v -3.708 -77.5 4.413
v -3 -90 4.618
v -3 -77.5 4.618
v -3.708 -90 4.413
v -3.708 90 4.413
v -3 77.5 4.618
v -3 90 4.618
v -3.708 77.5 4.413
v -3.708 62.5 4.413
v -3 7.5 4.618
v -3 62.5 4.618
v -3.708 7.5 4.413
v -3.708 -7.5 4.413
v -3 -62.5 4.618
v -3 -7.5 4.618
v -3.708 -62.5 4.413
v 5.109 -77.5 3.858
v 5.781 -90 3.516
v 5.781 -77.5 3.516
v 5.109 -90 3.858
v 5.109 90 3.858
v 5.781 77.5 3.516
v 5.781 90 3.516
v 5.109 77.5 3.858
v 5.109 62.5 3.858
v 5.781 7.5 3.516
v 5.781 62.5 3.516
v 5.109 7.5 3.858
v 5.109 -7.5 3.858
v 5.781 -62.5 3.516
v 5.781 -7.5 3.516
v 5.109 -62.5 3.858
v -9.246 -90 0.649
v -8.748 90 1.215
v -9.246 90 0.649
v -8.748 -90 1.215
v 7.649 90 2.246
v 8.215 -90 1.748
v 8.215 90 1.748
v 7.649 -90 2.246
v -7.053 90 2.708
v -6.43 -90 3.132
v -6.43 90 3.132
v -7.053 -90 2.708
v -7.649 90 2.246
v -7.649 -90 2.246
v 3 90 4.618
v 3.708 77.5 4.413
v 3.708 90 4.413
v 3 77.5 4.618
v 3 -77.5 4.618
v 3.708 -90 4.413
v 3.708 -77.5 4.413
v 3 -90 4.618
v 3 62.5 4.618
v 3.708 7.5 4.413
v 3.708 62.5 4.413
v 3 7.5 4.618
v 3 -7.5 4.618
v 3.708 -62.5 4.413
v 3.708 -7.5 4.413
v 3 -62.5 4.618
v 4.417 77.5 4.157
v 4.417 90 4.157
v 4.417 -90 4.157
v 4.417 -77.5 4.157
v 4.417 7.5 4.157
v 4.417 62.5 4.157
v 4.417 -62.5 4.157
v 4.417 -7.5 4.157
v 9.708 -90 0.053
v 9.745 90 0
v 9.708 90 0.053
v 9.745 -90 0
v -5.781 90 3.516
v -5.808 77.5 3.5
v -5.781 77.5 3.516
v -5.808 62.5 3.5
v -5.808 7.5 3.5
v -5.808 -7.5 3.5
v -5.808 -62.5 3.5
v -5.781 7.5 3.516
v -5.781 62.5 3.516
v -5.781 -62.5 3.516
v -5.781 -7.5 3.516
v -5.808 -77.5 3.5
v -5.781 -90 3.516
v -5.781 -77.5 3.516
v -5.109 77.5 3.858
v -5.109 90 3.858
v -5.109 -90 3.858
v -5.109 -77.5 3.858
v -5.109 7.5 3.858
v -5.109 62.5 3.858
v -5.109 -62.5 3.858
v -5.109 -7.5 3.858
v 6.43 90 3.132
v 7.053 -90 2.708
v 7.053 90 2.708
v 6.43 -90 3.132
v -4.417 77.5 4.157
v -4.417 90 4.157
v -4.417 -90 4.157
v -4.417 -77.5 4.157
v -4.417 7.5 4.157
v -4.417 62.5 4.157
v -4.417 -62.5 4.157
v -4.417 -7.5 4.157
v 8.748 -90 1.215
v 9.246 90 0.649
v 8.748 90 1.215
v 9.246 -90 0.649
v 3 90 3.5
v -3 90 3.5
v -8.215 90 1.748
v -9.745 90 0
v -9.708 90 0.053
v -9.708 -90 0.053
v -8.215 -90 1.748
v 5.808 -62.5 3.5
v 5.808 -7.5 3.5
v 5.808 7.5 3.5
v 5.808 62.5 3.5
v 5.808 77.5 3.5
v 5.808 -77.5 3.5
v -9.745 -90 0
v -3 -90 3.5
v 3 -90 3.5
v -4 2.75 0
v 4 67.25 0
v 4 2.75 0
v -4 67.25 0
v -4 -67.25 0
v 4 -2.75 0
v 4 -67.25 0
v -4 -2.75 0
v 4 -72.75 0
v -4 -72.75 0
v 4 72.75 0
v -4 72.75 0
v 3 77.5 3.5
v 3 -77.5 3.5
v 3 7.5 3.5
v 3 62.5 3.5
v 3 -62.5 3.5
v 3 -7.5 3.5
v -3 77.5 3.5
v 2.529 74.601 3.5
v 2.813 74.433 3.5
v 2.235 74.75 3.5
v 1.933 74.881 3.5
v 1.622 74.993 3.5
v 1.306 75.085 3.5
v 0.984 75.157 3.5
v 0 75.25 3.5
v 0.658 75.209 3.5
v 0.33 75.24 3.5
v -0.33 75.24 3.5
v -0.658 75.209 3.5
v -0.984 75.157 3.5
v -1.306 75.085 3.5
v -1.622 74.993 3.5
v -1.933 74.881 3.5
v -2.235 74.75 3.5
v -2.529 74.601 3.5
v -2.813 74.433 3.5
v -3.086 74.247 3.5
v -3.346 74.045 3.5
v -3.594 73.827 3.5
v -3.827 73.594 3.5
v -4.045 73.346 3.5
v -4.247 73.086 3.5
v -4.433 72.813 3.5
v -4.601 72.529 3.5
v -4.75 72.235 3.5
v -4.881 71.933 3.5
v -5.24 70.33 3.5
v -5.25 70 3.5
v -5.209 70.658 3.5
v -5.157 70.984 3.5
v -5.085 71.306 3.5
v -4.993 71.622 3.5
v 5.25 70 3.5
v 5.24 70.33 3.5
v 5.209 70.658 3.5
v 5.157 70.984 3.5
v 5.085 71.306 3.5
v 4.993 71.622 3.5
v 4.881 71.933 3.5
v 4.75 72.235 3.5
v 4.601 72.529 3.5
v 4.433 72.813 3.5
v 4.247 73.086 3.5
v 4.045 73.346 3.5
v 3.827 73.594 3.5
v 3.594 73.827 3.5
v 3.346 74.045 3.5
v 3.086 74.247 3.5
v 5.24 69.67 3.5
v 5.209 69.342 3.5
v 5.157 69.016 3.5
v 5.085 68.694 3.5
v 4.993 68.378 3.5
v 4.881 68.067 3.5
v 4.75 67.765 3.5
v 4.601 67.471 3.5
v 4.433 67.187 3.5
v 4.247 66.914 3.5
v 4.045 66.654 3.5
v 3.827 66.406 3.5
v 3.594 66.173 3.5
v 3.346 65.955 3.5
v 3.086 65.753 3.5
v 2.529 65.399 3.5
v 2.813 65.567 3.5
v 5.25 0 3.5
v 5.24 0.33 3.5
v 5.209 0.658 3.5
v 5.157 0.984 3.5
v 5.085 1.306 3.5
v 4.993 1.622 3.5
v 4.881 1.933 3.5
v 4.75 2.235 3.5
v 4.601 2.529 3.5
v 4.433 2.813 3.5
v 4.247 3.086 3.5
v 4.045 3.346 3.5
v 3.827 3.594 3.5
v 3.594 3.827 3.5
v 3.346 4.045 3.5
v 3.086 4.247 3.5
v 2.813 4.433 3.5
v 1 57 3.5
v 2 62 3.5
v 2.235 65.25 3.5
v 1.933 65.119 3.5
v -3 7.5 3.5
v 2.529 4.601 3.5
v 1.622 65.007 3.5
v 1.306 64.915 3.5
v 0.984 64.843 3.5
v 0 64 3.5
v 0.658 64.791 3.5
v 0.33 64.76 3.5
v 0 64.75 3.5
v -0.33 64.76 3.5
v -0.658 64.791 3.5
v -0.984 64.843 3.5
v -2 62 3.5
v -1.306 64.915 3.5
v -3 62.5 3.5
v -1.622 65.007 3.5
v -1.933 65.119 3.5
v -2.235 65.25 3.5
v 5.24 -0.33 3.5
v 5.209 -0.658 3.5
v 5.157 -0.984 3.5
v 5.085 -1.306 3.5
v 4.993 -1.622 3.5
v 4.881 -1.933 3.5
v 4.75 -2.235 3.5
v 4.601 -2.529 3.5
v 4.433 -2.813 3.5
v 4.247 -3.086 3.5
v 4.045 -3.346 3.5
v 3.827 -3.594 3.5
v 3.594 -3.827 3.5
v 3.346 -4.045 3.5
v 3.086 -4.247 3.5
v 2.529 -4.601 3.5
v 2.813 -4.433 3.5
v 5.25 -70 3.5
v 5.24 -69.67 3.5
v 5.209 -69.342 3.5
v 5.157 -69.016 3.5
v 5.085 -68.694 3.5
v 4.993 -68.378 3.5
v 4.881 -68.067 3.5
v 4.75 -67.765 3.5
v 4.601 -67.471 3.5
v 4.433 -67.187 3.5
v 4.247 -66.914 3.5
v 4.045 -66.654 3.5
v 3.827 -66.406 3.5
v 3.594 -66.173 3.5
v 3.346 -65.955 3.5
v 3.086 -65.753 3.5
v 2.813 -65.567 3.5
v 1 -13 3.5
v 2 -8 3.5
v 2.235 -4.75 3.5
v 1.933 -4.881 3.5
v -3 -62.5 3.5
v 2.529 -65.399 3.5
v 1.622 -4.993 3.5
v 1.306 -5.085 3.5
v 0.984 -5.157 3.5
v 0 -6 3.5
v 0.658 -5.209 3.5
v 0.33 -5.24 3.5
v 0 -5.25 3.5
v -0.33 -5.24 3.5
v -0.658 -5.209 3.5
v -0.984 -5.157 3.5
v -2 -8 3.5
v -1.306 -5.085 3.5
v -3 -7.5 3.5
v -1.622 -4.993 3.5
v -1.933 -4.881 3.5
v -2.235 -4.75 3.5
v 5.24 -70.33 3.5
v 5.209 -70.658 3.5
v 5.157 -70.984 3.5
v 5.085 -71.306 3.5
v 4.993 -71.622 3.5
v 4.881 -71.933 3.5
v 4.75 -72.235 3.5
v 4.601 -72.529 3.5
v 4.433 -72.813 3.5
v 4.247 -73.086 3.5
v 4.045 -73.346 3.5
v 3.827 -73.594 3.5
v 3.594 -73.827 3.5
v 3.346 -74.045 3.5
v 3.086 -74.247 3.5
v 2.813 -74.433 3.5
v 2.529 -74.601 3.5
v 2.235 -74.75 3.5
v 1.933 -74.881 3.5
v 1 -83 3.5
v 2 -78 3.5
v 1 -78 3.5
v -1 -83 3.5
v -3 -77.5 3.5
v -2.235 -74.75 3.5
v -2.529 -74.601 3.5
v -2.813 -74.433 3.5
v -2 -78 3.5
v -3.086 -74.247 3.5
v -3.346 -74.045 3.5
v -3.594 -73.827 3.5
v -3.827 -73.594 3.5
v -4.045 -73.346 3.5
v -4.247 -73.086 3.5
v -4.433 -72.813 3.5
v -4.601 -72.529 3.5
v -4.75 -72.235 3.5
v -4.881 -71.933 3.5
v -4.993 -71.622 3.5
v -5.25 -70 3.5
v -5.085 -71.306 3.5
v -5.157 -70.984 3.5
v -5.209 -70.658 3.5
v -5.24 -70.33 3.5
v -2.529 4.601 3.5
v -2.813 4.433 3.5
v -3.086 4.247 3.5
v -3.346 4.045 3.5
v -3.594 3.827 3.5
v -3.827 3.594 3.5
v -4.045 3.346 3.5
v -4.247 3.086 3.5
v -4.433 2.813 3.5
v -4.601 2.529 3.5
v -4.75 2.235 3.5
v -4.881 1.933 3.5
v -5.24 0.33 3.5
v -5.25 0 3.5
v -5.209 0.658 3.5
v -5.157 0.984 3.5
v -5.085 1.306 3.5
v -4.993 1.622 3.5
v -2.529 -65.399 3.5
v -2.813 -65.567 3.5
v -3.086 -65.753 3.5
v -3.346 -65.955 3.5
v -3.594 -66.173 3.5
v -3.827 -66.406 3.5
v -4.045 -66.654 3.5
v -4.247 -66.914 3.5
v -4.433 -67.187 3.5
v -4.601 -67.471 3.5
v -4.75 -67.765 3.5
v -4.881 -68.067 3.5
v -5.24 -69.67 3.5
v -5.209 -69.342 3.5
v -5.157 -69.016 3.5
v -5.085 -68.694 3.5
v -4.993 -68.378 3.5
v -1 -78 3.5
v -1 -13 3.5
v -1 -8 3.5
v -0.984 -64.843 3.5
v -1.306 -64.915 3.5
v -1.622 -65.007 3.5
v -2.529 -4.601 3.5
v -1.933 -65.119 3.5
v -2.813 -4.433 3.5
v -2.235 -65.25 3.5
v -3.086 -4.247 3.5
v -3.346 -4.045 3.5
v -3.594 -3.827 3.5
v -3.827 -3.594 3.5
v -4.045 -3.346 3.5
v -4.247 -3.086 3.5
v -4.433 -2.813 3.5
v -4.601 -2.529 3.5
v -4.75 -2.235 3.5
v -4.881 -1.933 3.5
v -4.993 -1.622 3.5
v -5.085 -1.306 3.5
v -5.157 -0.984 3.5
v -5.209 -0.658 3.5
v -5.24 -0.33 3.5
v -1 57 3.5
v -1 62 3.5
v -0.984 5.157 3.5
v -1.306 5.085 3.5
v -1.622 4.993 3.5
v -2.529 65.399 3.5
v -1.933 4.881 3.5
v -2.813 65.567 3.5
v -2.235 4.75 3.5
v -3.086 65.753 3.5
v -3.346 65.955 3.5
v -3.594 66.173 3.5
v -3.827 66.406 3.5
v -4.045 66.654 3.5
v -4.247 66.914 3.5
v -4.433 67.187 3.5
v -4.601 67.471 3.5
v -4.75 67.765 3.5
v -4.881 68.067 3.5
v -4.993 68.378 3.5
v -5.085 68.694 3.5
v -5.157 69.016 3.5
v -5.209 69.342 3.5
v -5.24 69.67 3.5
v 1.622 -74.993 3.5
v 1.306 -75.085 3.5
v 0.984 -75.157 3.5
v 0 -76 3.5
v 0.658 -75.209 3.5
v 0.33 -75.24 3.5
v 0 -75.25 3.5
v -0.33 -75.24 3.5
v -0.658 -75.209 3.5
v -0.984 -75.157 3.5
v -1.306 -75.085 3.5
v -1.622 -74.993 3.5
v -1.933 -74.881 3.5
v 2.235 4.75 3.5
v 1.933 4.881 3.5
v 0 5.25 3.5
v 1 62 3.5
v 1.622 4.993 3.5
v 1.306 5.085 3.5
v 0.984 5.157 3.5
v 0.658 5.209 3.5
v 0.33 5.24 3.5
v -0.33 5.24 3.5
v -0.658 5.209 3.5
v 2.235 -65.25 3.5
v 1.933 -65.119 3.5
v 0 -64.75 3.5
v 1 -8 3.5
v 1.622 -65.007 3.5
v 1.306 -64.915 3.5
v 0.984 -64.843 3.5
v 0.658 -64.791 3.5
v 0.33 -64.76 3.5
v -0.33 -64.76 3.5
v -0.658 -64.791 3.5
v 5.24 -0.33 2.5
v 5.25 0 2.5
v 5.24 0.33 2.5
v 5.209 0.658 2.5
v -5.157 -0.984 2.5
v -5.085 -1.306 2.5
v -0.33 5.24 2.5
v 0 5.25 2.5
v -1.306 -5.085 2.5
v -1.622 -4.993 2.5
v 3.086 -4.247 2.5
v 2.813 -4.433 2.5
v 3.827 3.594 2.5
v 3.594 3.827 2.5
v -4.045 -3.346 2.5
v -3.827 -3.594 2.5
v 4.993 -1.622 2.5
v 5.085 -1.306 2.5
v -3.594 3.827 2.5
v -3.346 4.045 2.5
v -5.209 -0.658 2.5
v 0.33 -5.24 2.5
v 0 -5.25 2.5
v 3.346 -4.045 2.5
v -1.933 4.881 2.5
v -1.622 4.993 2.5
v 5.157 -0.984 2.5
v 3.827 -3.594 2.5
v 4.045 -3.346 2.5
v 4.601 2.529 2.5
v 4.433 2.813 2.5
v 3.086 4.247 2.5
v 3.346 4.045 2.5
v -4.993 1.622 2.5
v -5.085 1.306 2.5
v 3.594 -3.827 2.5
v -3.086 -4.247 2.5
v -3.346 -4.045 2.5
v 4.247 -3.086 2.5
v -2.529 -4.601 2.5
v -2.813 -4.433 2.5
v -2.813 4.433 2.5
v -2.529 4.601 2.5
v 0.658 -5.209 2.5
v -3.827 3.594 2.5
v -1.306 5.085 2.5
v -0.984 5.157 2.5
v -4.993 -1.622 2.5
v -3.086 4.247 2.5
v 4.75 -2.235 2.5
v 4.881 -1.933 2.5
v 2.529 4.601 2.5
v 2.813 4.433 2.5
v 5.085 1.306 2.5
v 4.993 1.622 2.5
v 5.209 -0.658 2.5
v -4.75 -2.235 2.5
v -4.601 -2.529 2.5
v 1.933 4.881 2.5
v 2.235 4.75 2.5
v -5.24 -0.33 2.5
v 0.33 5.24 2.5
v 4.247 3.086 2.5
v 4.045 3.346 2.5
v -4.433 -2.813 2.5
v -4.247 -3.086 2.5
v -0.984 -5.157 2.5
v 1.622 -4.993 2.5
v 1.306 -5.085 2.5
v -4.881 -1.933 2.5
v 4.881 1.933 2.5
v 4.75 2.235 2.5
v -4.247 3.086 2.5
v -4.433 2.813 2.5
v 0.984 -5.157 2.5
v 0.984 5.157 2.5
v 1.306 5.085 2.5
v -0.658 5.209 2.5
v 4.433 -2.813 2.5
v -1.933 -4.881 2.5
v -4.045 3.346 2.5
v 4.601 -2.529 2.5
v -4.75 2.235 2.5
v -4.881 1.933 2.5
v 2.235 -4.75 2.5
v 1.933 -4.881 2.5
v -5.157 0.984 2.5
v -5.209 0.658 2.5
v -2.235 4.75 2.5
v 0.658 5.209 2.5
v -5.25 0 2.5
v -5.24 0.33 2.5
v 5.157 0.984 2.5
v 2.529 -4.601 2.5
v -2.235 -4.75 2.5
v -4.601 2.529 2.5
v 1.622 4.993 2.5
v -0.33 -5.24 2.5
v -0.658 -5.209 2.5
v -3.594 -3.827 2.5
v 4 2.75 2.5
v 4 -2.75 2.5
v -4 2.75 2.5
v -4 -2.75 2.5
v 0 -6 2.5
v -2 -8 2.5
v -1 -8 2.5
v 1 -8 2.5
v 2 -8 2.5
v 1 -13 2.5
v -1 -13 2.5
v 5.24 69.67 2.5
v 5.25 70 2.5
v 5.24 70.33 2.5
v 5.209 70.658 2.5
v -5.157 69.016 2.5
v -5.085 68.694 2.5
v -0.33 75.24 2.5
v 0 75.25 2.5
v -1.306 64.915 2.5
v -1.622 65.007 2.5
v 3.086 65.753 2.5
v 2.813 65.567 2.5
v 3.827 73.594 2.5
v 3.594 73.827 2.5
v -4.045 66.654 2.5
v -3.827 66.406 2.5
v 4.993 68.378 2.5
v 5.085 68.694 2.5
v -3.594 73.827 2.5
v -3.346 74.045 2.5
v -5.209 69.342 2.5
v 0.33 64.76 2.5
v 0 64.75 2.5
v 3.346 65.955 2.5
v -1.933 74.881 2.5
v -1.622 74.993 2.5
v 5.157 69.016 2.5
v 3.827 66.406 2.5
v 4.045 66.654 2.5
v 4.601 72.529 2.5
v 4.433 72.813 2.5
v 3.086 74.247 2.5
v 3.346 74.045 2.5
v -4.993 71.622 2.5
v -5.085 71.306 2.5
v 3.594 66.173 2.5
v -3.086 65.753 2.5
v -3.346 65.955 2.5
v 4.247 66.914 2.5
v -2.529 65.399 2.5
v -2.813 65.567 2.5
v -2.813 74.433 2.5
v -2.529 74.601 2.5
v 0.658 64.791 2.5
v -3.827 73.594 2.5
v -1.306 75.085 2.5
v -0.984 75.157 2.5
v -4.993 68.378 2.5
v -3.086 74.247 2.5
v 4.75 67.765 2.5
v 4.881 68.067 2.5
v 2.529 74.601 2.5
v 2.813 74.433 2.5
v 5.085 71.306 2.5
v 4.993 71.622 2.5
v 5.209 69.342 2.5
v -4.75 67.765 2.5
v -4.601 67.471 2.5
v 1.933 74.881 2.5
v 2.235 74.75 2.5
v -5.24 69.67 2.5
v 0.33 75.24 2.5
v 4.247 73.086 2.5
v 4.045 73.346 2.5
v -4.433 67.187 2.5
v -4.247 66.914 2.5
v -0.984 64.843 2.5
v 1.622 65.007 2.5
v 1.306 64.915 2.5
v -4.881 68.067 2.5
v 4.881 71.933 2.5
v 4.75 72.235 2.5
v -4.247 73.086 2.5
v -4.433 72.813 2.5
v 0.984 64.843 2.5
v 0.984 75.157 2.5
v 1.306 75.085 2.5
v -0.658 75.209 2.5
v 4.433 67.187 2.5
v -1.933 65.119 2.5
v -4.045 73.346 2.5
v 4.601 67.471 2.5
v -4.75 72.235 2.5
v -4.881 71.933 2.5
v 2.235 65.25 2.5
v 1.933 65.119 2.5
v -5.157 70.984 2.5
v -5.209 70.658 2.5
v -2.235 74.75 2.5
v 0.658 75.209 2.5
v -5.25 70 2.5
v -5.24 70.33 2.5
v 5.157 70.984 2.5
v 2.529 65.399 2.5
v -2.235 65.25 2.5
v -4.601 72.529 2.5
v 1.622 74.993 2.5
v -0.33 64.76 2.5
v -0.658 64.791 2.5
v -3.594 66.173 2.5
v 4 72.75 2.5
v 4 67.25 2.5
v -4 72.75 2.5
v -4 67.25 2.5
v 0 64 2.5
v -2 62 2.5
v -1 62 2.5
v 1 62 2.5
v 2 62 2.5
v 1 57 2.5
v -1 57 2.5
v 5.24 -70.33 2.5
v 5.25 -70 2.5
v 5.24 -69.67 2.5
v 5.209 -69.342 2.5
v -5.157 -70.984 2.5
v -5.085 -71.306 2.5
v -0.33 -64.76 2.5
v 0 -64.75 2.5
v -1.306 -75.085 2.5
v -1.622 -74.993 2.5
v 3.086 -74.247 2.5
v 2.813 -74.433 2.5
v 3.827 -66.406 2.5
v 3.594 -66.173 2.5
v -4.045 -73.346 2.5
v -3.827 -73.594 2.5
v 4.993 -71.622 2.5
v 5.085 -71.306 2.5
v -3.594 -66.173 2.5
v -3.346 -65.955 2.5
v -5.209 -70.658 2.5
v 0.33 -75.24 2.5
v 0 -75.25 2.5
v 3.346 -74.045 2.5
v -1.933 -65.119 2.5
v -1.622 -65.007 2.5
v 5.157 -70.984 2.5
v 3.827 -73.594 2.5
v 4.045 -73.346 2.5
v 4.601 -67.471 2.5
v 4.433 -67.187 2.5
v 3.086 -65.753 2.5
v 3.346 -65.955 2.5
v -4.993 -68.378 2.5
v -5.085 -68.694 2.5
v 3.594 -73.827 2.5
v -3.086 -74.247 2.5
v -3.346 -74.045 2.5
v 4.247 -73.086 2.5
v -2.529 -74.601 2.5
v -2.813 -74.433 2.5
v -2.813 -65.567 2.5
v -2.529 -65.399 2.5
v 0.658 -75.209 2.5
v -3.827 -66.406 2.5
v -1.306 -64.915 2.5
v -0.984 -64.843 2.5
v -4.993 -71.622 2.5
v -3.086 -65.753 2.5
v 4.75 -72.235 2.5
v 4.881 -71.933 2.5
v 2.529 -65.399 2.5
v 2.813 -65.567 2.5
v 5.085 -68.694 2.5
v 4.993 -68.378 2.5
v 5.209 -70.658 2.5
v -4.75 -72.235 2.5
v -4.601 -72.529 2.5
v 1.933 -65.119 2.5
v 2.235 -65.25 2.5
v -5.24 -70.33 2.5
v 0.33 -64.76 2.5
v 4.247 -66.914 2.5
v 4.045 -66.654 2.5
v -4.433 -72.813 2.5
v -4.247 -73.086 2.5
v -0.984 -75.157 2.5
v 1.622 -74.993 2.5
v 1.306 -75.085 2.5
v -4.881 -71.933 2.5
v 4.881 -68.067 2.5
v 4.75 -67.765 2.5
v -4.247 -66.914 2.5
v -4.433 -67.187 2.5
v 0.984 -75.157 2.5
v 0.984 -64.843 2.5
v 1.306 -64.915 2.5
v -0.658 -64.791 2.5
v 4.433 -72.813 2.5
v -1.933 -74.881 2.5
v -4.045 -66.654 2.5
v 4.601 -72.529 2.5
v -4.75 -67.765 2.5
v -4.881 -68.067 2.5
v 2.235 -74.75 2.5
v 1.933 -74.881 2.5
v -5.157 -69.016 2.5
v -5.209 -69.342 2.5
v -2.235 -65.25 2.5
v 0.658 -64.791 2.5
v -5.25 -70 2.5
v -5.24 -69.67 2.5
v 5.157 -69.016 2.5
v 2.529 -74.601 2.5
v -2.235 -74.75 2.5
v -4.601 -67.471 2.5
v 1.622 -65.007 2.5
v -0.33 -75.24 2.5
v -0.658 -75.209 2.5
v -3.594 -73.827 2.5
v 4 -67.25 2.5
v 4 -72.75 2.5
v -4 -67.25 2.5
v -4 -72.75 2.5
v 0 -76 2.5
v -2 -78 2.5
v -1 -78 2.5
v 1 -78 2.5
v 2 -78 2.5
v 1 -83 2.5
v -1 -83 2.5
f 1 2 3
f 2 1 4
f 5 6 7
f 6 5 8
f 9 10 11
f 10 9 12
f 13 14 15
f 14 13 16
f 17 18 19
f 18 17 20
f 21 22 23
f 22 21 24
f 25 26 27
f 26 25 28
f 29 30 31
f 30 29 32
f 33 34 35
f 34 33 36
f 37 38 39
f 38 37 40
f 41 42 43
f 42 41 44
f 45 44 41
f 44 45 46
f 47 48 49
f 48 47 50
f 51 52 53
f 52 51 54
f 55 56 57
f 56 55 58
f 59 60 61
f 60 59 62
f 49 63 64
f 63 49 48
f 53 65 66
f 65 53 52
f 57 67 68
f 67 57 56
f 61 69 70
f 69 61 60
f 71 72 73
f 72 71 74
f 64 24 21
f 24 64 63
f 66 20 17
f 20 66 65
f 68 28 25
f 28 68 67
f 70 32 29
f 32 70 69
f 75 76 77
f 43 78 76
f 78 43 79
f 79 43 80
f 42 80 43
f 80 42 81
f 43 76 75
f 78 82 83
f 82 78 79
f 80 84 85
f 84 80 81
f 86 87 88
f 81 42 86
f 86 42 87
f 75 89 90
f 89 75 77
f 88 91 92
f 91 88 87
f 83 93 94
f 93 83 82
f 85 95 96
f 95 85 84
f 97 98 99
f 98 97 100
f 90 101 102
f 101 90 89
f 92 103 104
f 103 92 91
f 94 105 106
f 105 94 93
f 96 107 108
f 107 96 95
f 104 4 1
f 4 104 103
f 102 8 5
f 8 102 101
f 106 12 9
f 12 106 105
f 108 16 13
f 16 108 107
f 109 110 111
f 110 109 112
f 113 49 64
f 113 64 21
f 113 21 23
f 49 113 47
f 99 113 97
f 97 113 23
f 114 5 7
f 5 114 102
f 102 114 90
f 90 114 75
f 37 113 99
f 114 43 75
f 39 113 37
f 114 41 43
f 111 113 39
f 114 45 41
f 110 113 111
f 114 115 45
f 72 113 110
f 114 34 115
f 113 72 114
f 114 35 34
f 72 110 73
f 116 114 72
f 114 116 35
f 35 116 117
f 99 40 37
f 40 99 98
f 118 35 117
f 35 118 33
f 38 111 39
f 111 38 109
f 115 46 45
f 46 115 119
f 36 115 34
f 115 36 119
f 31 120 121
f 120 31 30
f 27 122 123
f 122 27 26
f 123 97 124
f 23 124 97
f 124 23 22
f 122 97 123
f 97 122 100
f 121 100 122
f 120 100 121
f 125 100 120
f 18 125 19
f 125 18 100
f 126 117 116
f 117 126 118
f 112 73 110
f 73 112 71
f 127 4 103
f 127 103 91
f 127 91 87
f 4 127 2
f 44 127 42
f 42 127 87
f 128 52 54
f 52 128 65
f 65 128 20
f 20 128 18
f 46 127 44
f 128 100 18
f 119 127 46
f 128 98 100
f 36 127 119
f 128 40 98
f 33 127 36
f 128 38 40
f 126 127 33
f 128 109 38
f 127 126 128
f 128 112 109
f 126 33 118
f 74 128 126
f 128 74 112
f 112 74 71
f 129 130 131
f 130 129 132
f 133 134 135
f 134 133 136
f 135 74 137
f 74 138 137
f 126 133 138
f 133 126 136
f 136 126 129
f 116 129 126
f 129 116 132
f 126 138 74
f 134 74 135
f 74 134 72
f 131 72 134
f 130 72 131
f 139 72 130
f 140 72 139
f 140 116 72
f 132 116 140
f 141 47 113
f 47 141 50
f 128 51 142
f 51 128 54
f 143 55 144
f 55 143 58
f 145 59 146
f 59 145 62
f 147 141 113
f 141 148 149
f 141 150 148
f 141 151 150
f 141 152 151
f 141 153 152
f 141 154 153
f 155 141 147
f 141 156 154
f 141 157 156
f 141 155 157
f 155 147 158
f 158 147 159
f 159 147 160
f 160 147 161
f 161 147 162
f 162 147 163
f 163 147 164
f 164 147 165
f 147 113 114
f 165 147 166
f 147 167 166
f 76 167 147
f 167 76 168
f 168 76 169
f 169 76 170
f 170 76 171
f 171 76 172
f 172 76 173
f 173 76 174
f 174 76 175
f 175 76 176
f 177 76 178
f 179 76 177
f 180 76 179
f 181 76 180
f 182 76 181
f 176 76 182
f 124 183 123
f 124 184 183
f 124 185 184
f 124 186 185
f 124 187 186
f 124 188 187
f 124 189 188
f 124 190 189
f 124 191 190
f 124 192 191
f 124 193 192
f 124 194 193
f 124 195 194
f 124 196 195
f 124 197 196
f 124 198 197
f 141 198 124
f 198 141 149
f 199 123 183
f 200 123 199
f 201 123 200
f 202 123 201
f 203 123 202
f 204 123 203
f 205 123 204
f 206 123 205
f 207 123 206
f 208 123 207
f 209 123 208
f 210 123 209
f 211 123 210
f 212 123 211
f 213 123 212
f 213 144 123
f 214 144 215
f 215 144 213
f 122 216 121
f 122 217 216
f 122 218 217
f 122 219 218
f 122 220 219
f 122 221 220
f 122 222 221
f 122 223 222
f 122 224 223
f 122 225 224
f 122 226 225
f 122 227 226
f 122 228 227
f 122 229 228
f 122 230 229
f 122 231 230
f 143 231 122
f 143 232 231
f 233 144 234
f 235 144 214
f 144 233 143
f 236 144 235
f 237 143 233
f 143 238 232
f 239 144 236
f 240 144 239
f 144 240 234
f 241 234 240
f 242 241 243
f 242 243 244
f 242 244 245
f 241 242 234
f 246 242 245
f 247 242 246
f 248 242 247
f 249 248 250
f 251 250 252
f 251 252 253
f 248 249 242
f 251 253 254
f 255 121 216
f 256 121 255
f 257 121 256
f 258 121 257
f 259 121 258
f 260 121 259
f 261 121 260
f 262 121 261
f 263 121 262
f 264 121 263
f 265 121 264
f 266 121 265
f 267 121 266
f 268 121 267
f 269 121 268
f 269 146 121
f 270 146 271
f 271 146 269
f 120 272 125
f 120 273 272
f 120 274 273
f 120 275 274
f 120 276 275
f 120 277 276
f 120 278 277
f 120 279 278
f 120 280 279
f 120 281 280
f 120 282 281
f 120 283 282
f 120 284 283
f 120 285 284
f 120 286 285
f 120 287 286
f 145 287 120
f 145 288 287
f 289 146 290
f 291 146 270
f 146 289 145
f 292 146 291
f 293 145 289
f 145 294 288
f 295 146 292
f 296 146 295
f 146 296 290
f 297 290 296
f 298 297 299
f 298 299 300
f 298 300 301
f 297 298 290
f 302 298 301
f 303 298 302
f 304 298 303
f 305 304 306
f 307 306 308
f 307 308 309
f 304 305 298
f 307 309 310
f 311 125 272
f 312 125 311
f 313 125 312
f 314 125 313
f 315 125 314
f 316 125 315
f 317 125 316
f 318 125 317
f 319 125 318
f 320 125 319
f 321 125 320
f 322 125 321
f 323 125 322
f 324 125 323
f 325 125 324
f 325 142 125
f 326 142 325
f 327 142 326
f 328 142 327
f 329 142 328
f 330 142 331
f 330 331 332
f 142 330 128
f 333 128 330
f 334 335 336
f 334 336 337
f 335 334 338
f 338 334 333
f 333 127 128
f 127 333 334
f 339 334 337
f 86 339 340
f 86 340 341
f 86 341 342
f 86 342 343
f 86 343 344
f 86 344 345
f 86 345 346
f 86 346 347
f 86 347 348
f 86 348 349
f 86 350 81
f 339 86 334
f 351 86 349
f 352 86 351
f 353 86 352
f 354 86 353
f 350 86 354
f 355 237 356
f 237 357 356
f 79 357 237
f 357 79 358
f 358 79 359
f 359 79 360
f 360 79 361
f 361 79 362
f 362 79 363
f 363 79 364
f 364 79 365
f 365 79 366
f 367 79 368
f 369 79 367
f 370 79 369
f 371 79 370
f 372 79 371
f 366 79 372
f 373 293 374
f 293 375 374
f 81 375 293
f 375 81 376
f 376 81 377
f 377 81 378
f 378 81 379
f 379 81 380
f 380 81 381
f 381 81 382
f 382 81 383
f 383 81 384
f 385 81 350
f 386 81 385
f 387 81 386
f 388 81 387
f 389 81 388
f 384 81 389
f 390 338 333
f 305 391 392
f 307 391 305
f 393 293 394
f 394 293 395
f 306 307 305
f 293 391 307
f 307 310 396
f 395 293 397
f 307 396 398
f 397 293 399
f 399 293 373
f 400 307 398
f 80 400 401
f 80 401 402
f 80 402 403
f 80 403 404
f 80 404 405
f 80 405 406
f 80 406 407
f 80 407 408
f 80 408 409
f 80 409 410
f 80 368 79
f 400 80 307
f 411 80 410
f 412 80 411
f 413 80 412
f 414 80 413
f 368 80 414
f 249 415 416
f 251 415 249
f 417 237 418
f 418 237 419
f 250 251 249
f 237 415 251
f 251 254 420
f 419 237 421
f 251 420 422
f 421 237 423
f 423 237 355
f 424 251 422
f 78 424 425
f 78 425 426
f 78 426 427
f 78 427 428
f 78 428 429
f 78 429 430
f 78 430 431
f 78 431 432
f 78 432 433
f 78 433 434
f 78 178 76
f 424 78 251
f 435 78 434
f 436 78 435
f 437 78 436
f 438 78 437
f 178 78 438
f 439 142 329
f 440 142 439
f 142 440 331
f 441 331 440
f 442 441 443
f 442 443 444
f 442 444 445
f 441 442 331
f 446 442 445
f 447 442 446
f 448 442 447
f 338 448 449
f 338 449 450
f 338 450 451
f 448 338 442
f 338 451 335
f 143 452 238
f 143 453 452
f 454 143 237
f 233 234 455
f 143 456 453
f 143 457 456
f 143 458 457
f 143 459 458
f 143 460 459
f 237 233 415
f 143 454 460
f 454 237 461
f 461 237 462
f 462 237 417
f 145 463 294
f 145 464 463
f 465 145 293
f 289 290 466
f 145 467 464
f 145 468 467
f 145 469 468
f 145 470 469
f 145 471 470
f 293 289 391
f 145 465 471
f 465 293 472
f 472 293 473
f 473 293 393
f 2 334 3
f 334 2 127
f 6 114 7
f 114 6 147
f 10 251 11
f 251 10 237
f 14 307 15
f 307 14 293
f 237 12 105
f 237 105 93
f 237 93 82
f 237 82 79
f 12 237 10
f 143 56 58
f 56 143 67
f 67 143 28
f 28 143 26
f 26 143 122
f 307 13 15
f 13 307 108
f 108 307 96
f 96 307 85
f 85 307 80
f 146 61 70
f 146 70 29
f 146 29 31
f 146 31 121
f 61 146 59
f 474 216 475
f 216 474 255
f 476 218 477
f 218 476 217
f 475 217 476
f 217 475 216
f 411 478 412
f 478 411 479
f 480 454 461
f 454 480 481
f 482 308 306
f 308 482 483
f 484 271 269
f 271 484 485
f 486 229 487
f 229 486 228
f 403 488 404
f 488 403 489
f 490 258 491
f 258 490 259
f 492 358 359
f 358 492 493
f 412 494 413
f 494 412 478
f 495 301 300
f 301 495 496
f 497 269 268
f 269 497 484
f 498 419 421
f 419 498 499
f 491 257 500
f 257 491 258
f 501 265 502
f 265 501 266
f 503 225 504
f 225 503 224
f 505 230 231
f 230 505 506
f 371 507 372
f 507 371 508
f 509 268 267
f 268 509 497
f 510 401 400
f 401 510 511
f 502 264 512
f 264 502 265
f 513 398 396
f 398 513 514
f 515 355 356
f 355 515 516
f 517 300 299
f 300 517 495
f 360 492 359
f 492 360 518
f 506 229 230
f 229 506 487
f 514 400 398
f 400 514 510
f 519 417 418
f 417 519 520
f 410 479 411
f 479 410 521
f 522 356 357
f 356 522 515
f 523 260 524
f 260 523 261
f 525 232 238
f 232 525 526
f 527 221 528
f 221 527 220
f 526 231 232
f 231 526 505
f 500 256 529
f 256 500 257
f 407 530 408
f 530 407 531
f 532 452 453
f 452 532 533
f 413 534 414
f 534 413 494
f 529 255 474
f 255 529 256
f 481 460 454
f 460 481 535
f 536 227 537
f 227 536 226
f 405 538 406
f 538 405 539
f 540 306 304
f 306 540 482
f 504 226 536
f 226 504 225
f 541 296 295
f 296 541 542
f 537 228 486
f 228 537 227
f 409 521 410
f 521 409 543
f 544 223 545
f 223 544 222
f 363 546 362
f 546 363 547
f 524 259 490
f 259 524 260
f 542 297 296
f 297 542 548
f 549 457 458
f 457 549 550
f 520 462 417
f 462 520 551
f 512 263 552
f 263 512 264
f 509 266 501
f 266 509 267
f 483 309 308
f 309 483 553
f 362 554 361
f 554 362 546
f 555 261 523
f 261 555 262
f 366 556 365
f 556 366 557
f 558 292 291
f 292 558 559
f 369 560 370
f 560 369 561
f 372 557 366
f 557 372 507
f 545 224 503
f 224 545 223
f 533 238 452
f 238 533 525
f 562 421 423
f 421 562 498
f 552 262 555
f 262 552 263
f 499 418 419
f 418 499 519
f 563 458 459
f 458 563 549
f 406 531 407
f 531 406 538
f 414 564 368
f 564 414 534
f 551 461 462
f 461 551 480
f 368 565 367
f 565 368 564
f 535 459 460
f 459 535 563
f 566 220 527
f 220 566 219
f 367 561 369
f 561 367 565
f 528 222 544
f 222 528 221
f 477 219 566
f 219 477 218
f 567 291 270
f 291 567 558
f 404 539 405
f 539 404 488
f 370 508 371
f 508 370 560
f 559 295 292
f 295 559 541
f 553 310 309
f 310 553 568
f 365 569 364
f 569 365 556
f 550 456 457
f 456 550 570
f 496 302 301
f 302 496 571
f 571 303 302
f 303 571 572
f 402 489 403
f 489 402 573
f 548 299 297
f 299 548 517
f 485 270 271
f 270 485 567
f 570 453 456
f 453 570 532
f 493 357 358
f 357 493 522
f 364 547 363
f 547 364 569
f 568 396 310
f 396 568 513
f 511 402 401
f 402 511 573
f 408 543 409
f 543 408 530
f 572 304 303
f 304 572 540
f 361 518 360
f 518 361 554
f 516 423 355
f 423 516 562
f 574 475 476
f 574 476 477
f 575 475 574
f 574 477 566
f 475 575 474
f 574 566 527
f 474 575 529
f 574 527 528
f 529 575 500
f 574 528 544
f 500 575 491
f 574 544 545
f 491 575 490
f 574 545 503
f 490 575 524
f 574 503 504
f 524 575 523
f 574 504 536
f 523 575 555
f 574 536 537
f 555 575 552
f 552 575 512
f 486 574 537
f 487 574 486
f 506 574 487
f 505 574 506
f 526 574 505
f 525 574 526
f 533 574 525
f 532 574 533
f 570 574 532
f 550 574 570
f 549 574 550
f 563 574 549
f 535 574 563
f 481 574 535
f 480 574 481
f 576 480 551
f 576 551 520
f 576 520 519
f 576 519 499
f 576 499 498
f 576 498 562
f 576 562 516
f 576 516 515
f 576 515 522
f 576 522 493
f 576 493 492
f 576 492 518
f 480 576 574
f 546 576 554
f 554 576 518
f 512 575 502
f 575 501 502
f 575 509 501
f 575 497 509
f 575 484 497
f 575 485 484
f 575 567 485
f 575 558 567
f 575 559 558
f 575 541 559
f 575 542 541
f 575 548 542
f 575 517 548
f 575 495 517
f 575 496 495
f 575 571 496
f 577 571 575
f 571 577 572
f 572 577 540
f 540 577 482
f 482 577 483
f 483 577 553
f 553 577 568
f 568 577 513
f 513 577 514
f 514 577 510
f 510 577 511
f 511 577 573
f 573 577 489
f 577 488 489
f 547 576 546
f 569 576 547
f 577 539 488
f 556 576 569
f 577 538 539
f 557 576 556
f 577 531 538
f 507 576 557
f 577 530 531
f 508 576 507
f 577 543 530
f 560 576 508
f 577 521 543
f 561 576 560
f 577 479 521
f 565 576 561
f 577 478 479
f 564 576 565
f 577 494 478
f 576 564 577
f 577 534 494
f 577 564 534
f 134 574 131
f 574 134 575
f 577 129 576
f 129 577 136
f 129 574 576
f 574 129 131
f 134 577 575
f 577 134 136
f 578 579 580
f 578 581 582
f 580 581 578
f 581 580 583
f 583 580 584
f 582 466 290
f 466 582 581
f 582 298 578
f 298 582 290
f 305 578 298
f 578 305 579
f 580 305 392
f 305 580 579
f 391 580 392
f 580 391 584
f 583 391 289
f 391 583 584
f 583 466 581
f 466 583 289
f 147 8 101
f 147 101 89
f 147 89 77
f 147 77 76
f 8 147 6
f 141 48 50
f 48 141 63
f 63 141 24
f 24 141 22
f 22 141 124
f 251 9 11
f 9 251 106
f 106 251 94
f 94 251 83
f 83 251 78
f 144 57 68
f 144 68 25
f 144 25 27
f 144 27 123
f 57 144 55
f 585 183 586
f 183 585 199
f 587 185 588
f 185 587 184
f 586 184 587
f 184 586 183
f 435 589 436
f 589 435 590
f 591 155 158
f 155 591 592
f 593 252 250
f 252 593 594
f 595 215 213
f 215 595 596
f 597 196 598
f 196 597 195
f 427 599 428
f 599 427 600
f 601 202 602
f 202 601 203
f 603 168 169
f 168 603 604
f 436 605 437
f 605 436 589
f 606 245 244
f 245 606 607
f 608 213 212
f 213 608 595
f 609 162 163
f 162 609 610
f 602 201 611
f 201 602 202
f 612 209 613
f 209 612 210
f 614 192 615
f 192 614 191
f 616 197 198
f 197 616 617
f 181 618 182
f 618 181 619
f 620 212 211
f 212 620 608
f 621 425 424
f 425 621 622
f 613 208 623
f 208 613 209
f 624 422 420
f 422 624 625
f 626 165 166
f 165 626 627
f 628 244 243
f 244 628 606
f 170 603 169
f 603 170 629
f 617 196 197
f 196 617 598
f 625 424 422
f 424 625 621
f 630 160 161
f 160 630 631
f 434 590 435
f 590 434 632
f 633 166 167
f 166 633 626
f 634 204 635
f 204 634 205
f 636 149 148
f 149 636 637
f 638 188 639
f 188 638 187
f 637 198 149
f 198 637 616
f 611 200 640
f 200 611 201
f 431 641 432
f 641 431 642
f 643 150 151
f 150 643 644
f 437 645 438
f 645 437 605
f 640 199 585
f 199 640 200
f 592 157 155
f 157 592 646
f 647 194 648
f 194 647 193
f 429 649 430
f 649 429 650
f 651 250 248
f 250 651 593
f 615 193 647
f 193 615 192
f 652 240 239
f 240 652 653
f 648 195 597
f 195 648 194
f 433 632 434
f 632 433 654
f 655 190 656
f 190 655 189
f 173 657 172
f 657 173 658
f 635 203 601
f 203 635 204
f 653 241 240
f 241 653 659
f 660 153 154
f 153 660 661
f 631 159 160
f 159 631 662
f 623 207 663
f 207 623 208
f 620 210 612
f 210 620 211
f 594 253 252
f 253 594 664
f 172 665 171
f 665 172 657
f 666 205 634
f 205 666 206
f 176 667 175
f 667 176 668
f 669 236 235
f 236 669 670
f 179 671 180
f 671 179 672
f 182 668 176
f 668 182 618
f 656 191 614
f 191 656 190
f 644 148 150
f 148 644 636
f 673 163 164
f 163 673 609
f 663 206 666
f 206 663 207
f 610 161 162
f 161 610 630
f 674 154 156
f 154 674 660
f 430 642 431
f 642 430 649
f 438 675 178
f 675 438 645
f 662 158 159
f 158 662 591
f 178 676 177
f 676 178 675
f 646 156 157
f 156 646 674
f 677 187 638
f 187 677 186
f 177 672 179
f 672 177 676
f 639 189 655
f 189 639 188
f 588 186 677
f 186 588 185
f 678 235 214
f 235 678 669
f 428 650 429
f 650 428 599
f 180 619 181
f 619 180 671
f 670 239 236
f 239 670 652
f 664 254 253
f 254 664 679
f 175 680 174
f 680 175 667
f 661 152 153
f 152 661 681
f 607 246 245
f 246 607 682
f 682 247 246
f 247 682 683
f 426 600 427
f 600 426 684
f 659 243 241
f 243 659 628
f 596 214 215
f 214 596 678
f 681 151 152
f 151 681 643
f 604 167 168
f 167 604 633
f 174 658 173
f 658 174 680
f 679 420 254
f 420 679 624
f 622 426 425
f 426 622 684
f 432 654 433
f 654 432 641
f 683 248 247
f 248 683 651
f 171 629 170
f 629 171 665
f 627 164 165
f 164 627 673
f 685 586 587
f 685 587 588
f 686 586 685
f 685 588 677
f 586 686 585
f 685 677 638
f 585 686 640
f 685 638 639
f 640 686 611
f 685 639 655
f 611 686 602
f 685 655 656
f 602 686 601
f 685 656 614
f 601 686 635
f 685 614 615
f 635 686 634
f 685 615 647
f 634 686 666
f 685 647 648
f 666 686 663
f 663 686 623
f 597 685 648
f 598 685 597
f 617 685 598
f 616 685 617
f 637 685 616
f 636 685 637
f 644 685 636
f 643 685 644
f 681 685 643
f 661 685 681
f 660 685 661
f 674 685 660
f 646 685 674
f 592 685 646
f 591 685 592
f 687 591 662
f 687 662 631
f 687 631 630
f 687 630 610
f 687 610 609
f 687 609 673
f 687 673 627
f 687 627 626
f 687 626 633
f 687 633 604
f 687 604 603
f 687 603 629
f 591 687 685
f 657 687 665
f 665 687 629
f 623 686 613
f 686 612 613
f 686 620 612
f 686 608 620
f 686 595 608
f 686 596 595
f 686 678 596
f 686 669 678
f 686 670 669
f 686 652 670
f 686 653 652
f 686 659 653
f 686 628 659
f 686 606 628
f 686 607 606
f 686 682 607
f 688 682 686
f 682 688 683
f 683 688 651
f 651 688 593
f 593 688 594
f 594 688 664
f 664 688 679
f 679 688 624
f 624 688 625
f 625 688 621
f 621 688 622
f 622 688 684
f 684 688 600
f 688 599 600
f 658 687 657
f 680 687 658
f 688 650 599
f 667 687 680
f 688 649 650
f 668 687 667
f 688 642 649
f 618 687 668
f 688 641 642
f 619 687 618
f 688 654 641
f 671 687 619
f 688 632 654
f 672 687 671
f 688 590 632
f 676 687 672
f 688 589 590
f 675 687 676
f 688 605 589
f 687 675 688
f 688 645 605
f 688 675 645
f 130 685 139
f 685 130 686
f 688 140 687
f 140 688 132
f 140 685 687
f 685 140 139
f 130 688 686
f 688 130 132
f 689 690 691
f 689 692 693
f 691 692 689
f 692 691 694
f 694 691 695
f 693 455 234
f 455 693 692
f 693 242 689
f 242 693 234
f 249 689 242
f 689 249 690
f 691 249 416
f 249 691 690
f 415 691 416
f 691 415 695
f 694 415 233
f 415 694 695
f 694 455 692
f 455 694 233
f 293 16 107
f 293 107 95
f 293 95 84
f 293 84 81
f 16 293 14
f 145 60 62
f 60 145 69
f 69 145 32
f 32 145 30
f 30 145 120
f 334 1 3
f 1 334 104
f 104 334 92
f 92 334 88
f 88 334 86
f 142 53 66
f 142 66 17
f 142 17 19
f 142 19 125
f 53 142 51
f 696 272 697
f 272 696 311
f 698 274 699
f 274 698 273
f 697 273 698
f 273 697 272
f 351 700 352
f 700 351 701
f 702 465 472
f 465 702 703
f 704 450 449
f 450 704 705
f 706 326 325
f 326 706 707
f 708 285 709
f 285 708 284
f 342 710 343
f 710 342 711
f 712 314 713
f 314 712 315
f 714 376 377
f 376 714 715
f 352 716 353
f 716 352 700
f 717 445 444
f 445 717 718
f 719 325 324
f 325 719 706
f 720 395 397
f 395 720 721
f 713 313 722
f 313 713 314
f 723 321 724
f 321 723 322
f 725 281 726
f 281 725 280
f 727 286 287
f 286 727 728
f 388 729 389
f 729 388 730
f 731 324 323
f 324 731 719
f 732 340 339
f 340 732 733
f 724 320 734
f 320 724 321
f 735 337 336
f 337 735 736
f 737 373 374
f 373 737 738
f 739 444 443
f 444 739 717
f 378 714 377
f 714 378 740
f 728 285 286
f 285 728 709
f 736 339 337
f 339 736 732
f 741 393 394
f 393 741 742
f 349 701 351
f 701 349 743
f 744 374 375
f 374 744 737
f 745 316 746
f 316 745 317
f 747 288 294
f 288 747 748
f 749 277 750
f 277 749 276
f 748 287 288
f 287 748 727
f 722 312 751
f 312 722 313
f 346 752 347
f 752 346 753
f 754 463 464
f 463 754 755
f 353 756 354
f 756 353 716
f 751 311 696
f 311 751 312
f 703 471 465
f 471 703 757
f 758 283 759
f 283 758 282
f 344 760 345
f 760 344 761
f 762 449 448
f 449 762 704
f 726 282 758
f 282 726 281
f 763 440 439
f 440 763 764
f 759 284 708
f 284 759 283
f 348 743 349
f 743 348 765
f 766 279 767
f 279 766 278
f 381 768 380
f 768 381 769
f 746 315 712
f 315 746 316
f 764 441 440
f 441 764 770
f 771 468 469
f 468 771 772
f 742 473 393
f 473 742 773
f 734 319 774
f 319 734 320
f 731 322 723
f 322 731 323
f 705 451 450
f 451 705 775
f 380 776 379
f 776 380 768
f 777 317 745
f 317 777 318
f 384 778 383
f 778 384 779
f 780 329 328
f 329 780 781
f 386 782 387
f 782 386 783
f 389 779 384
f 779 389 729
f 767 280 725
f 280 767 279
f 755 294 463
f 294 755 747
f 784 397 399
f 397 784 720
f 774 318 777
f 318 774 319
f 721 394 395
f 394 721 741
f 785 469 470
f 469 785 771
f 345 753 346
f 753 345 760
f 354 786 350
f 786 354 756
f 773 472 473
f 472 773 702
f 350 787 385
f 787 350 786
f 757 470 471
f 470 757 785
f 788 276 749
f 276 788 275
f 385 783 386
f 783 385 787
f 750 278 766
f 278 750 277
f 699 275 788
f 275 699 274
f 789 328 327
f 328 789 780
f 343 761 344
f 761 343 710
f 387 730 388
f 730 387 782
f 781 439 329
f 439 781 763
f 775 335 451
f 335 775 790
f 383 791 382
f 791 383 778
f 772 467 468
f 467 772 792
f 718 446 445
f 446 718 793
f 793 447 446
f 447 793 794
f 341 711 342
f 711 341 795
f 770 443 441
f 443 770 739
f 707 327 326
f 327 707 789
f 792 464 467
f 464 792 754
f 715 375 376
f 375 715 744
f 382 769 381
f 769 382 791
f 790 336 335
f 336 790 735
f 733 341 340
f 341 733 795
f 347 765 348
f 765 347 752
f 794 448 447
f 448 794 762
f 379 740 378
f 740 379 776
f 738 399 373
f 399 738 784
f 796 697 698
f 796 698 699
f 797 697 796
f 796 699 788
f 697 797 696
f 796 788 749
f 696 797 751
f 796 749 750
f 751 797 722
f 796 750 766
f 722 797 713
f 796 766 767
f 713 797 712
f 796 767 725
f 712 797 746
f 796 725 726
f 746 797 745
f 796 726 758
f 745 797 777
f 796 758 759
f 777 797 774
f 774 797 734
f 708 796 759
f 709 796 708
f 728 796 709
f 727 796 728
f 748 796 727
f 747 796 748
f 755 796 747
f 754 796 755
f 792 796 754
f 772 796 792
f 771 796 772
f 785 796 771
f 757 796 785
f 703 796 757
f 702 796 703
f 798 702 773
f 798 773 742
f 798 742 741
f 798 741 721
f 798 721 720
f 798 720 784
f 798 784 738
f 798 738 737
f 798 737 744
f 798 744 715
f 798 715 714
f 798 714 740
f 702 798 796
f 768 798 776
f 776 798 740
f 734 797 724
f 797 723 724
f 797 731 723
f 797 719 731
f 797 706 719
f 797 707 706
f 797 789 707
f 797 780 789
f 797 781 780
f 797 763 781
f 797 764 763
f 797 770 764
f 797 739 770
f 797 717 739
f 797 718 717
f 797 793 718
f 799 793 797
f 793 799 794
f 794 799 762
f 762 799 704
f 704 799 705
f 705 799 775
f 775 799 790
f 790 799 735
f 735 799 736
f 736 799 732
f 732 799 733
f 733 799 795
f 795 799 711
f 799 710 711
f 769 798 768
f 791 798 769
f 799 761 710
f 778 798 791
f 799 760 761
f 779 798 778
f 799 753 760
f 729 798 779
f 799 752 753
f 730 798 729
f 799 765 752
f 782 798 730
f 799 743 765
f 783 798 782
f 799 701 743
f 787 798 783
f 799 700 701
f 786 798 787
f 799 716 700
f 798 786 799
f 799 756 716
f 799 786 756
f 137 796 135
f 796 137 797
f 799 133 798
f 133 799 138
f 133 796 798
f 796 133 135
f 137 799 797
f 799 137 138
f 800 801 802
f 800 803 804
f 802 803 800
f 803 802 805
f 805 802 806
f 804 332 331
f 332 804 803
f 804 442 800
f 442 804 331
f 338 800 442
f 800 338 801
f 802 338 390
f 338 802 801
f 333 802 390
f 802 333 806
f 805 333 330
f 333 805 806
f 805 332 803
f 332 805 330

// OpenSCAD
/* [Parameters for LED jig] */
//Gap between LEDs
gap = 70;//[10:0.5:150]

/* [Hidden] */
Base_length = 2*gap+40;
difference(){
difference(){
difference(){
Base();
translate([0,0,5.5])
LEDhole();
}
translate([0,gap,5.5])
LEDhole();
}
translate([0,-gap,5.5])
LEDhole();
}
module LEDhole(){
union(){
cube(size = [15,15,4], center = true);
translate([0,0,-1])
    cylinder(h = 4, r=5.25, center = true, $fn = 100);
translate([0,0,-5])
    cube(size = [8,5.5,5.5], center = true);
}
translate([0,-13,-3])
linear_extrude(height = 1, center = false, convexity = 10, twist = 0)
polygon([[-1,0],[-1,5],[-2,5],[0,7],[2,5],[1,5],[1,0]]);
}
module Base(){
translate([0,0,-7])
//difference(){
difference(){
difference(){
rotate([90,0,0])
cylinder(h = Base_length, r=12, center = true, $fn = 100);
translate([0,0,-13])
cube(size = [40,Base_length+1,40], center = true);
}
translate([0,0,11.25])
cube(size = [6,Base_length+1,1.5], center = true);
}}
